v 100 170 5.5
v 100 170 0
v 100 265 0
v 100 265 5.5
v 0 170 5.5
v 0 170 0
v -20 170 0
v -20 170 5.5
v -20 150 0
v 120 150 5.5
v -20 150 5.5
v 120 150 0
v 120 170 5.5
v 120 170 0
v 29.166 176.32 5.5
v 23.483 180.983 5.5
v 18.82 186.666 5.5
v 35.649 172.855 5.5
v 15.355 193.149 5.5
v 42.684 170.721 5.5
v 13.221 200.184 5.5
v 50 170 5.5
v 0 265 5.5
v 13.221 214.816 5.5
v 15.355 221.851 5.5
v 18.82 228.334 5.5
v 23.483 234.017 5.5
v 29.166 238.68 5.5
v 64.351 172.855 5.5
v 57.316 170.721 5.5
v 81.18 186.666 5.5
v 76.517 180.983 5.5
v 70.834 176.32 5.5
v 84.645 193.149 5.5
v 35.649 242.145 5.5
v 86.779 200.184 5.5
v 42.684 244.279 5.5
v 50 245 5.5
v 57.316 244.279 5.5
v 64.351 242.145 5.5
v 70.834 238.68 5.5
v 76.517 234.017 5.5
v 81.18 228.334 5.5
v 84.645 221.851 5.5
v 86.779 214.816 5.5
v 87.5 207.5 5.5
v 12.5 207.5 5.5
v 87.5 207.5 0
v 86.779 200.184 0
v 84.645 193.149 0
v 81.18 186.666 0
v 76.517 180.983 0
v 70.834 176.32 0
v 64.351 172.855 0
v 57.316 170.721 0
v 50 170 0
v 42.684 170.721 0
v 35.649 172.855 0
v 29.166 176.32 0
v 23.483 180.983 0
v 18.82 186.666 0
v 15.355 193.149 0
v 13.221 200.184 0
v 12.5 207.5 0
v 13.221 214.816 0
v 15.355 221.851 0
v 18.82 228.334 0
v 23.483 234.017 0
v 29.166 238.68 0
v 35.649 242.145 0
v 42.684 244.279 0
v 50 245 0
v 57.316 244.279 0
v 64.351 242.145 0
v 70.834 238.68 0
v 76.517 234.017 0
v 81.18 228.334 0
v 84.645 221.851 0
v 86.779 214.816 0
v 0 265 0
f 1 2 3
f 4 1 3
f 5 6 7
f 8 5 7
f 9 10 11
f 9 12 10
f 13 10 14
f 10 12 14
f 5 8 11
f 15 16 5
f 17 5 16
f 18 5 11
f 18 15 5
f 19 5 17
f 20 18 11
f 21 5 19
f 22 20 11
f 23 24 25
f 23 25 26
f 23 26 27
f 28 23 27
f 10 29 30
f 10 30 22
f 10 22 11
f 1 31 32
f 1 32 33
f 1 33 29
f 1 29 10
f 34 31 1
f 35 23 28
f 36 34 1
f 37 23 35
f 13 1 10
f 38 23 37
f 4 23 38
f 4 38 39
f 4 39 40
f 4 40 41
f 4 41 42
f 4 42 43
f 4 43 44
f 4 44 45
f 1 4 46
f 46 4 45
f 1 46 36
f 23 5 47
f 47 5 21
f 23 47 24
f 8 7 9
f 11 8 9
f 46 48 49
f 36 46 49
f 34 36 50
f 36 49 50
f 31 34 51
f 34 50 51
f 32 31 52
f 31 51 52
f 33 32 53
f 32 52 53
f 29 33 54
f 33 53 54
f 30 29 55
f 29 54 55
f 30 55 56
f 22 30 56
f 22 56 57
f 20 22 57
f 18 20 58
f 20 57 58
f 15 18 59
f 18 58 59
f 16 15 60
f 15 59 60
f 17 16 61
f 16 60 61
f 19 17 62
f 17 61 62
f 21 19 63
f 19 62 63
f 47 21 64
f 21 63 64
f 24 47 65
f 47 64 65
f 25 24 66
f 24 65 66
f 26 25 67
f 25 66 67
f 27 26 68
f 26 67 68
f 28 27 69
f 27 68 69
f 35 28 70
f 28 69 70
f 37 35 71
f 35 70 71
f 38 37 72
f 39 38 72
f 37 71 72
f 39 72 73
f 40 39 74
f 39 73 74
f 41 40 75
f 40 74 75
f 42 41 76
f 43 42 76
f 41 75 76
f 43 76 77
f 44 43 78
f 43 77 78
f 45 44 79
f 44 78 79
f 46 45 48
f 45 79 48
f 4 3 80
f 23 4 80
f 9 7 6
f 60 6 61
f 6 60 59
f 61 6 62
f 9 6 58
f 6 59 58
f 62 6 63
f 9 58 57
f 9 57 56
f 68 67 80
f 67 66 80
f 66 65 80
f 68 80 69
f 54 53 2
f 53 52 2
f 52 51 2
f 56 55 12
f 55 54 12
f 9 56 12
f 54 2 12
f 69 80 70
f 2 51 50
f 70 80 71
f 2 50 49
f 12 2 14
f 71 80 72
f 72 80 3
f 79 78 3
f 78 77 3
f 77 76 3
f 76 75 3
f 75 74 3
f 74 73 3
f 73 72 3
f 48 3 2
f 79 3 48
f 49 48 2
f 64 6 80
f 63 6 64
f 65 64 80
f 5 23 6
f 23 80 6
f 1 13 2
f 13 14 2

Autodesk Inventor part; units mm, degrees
ref_plane "YZ Plane" through (0, 0, 0) normal (1, 0, 0) x (0, 1, 0)
ref_plane "XZ Plane" through (0, 0, 0) normal (0, 1, 0) x (-1, 0, 0)
ref_plane "XY Plane" through (0, 0, 0) normal (0, 0, 1) x (1, 0, 0)
sketch "Sketch1" plane through (0, 0, 0) normal (0, 0, 1) x (1, 0, 0)
  line L0 (100, 150) -> (0, 150)
  circle A0 centre (50, 207.5) radius 37.5
  line L1 (120, 170) -> (-20, 170)
  line L2 (0, 170) -> (100, 170)
  line L3 (100, 170) -> (100, 265)
  line L4 (100, 265) -> (0, 265)
  line L5 (0, 265) -> (0, 170)
  line L6 (-20, 170) -> (-20, 150)
  line L7 (-20, 150) -> (0, 150)
  line L8 (100, 150) -> (120, 150)
  line L9 (120, 150) -> (120, 170)
  point P0 (0, 0)
  dimension "d0" = 75
  dimension "d1" = 140
  dimension "d2" = 95
extrude "Extrusion1" add sketch "Sketch1" along normal blind 5.5
properties part number "anillo2"
